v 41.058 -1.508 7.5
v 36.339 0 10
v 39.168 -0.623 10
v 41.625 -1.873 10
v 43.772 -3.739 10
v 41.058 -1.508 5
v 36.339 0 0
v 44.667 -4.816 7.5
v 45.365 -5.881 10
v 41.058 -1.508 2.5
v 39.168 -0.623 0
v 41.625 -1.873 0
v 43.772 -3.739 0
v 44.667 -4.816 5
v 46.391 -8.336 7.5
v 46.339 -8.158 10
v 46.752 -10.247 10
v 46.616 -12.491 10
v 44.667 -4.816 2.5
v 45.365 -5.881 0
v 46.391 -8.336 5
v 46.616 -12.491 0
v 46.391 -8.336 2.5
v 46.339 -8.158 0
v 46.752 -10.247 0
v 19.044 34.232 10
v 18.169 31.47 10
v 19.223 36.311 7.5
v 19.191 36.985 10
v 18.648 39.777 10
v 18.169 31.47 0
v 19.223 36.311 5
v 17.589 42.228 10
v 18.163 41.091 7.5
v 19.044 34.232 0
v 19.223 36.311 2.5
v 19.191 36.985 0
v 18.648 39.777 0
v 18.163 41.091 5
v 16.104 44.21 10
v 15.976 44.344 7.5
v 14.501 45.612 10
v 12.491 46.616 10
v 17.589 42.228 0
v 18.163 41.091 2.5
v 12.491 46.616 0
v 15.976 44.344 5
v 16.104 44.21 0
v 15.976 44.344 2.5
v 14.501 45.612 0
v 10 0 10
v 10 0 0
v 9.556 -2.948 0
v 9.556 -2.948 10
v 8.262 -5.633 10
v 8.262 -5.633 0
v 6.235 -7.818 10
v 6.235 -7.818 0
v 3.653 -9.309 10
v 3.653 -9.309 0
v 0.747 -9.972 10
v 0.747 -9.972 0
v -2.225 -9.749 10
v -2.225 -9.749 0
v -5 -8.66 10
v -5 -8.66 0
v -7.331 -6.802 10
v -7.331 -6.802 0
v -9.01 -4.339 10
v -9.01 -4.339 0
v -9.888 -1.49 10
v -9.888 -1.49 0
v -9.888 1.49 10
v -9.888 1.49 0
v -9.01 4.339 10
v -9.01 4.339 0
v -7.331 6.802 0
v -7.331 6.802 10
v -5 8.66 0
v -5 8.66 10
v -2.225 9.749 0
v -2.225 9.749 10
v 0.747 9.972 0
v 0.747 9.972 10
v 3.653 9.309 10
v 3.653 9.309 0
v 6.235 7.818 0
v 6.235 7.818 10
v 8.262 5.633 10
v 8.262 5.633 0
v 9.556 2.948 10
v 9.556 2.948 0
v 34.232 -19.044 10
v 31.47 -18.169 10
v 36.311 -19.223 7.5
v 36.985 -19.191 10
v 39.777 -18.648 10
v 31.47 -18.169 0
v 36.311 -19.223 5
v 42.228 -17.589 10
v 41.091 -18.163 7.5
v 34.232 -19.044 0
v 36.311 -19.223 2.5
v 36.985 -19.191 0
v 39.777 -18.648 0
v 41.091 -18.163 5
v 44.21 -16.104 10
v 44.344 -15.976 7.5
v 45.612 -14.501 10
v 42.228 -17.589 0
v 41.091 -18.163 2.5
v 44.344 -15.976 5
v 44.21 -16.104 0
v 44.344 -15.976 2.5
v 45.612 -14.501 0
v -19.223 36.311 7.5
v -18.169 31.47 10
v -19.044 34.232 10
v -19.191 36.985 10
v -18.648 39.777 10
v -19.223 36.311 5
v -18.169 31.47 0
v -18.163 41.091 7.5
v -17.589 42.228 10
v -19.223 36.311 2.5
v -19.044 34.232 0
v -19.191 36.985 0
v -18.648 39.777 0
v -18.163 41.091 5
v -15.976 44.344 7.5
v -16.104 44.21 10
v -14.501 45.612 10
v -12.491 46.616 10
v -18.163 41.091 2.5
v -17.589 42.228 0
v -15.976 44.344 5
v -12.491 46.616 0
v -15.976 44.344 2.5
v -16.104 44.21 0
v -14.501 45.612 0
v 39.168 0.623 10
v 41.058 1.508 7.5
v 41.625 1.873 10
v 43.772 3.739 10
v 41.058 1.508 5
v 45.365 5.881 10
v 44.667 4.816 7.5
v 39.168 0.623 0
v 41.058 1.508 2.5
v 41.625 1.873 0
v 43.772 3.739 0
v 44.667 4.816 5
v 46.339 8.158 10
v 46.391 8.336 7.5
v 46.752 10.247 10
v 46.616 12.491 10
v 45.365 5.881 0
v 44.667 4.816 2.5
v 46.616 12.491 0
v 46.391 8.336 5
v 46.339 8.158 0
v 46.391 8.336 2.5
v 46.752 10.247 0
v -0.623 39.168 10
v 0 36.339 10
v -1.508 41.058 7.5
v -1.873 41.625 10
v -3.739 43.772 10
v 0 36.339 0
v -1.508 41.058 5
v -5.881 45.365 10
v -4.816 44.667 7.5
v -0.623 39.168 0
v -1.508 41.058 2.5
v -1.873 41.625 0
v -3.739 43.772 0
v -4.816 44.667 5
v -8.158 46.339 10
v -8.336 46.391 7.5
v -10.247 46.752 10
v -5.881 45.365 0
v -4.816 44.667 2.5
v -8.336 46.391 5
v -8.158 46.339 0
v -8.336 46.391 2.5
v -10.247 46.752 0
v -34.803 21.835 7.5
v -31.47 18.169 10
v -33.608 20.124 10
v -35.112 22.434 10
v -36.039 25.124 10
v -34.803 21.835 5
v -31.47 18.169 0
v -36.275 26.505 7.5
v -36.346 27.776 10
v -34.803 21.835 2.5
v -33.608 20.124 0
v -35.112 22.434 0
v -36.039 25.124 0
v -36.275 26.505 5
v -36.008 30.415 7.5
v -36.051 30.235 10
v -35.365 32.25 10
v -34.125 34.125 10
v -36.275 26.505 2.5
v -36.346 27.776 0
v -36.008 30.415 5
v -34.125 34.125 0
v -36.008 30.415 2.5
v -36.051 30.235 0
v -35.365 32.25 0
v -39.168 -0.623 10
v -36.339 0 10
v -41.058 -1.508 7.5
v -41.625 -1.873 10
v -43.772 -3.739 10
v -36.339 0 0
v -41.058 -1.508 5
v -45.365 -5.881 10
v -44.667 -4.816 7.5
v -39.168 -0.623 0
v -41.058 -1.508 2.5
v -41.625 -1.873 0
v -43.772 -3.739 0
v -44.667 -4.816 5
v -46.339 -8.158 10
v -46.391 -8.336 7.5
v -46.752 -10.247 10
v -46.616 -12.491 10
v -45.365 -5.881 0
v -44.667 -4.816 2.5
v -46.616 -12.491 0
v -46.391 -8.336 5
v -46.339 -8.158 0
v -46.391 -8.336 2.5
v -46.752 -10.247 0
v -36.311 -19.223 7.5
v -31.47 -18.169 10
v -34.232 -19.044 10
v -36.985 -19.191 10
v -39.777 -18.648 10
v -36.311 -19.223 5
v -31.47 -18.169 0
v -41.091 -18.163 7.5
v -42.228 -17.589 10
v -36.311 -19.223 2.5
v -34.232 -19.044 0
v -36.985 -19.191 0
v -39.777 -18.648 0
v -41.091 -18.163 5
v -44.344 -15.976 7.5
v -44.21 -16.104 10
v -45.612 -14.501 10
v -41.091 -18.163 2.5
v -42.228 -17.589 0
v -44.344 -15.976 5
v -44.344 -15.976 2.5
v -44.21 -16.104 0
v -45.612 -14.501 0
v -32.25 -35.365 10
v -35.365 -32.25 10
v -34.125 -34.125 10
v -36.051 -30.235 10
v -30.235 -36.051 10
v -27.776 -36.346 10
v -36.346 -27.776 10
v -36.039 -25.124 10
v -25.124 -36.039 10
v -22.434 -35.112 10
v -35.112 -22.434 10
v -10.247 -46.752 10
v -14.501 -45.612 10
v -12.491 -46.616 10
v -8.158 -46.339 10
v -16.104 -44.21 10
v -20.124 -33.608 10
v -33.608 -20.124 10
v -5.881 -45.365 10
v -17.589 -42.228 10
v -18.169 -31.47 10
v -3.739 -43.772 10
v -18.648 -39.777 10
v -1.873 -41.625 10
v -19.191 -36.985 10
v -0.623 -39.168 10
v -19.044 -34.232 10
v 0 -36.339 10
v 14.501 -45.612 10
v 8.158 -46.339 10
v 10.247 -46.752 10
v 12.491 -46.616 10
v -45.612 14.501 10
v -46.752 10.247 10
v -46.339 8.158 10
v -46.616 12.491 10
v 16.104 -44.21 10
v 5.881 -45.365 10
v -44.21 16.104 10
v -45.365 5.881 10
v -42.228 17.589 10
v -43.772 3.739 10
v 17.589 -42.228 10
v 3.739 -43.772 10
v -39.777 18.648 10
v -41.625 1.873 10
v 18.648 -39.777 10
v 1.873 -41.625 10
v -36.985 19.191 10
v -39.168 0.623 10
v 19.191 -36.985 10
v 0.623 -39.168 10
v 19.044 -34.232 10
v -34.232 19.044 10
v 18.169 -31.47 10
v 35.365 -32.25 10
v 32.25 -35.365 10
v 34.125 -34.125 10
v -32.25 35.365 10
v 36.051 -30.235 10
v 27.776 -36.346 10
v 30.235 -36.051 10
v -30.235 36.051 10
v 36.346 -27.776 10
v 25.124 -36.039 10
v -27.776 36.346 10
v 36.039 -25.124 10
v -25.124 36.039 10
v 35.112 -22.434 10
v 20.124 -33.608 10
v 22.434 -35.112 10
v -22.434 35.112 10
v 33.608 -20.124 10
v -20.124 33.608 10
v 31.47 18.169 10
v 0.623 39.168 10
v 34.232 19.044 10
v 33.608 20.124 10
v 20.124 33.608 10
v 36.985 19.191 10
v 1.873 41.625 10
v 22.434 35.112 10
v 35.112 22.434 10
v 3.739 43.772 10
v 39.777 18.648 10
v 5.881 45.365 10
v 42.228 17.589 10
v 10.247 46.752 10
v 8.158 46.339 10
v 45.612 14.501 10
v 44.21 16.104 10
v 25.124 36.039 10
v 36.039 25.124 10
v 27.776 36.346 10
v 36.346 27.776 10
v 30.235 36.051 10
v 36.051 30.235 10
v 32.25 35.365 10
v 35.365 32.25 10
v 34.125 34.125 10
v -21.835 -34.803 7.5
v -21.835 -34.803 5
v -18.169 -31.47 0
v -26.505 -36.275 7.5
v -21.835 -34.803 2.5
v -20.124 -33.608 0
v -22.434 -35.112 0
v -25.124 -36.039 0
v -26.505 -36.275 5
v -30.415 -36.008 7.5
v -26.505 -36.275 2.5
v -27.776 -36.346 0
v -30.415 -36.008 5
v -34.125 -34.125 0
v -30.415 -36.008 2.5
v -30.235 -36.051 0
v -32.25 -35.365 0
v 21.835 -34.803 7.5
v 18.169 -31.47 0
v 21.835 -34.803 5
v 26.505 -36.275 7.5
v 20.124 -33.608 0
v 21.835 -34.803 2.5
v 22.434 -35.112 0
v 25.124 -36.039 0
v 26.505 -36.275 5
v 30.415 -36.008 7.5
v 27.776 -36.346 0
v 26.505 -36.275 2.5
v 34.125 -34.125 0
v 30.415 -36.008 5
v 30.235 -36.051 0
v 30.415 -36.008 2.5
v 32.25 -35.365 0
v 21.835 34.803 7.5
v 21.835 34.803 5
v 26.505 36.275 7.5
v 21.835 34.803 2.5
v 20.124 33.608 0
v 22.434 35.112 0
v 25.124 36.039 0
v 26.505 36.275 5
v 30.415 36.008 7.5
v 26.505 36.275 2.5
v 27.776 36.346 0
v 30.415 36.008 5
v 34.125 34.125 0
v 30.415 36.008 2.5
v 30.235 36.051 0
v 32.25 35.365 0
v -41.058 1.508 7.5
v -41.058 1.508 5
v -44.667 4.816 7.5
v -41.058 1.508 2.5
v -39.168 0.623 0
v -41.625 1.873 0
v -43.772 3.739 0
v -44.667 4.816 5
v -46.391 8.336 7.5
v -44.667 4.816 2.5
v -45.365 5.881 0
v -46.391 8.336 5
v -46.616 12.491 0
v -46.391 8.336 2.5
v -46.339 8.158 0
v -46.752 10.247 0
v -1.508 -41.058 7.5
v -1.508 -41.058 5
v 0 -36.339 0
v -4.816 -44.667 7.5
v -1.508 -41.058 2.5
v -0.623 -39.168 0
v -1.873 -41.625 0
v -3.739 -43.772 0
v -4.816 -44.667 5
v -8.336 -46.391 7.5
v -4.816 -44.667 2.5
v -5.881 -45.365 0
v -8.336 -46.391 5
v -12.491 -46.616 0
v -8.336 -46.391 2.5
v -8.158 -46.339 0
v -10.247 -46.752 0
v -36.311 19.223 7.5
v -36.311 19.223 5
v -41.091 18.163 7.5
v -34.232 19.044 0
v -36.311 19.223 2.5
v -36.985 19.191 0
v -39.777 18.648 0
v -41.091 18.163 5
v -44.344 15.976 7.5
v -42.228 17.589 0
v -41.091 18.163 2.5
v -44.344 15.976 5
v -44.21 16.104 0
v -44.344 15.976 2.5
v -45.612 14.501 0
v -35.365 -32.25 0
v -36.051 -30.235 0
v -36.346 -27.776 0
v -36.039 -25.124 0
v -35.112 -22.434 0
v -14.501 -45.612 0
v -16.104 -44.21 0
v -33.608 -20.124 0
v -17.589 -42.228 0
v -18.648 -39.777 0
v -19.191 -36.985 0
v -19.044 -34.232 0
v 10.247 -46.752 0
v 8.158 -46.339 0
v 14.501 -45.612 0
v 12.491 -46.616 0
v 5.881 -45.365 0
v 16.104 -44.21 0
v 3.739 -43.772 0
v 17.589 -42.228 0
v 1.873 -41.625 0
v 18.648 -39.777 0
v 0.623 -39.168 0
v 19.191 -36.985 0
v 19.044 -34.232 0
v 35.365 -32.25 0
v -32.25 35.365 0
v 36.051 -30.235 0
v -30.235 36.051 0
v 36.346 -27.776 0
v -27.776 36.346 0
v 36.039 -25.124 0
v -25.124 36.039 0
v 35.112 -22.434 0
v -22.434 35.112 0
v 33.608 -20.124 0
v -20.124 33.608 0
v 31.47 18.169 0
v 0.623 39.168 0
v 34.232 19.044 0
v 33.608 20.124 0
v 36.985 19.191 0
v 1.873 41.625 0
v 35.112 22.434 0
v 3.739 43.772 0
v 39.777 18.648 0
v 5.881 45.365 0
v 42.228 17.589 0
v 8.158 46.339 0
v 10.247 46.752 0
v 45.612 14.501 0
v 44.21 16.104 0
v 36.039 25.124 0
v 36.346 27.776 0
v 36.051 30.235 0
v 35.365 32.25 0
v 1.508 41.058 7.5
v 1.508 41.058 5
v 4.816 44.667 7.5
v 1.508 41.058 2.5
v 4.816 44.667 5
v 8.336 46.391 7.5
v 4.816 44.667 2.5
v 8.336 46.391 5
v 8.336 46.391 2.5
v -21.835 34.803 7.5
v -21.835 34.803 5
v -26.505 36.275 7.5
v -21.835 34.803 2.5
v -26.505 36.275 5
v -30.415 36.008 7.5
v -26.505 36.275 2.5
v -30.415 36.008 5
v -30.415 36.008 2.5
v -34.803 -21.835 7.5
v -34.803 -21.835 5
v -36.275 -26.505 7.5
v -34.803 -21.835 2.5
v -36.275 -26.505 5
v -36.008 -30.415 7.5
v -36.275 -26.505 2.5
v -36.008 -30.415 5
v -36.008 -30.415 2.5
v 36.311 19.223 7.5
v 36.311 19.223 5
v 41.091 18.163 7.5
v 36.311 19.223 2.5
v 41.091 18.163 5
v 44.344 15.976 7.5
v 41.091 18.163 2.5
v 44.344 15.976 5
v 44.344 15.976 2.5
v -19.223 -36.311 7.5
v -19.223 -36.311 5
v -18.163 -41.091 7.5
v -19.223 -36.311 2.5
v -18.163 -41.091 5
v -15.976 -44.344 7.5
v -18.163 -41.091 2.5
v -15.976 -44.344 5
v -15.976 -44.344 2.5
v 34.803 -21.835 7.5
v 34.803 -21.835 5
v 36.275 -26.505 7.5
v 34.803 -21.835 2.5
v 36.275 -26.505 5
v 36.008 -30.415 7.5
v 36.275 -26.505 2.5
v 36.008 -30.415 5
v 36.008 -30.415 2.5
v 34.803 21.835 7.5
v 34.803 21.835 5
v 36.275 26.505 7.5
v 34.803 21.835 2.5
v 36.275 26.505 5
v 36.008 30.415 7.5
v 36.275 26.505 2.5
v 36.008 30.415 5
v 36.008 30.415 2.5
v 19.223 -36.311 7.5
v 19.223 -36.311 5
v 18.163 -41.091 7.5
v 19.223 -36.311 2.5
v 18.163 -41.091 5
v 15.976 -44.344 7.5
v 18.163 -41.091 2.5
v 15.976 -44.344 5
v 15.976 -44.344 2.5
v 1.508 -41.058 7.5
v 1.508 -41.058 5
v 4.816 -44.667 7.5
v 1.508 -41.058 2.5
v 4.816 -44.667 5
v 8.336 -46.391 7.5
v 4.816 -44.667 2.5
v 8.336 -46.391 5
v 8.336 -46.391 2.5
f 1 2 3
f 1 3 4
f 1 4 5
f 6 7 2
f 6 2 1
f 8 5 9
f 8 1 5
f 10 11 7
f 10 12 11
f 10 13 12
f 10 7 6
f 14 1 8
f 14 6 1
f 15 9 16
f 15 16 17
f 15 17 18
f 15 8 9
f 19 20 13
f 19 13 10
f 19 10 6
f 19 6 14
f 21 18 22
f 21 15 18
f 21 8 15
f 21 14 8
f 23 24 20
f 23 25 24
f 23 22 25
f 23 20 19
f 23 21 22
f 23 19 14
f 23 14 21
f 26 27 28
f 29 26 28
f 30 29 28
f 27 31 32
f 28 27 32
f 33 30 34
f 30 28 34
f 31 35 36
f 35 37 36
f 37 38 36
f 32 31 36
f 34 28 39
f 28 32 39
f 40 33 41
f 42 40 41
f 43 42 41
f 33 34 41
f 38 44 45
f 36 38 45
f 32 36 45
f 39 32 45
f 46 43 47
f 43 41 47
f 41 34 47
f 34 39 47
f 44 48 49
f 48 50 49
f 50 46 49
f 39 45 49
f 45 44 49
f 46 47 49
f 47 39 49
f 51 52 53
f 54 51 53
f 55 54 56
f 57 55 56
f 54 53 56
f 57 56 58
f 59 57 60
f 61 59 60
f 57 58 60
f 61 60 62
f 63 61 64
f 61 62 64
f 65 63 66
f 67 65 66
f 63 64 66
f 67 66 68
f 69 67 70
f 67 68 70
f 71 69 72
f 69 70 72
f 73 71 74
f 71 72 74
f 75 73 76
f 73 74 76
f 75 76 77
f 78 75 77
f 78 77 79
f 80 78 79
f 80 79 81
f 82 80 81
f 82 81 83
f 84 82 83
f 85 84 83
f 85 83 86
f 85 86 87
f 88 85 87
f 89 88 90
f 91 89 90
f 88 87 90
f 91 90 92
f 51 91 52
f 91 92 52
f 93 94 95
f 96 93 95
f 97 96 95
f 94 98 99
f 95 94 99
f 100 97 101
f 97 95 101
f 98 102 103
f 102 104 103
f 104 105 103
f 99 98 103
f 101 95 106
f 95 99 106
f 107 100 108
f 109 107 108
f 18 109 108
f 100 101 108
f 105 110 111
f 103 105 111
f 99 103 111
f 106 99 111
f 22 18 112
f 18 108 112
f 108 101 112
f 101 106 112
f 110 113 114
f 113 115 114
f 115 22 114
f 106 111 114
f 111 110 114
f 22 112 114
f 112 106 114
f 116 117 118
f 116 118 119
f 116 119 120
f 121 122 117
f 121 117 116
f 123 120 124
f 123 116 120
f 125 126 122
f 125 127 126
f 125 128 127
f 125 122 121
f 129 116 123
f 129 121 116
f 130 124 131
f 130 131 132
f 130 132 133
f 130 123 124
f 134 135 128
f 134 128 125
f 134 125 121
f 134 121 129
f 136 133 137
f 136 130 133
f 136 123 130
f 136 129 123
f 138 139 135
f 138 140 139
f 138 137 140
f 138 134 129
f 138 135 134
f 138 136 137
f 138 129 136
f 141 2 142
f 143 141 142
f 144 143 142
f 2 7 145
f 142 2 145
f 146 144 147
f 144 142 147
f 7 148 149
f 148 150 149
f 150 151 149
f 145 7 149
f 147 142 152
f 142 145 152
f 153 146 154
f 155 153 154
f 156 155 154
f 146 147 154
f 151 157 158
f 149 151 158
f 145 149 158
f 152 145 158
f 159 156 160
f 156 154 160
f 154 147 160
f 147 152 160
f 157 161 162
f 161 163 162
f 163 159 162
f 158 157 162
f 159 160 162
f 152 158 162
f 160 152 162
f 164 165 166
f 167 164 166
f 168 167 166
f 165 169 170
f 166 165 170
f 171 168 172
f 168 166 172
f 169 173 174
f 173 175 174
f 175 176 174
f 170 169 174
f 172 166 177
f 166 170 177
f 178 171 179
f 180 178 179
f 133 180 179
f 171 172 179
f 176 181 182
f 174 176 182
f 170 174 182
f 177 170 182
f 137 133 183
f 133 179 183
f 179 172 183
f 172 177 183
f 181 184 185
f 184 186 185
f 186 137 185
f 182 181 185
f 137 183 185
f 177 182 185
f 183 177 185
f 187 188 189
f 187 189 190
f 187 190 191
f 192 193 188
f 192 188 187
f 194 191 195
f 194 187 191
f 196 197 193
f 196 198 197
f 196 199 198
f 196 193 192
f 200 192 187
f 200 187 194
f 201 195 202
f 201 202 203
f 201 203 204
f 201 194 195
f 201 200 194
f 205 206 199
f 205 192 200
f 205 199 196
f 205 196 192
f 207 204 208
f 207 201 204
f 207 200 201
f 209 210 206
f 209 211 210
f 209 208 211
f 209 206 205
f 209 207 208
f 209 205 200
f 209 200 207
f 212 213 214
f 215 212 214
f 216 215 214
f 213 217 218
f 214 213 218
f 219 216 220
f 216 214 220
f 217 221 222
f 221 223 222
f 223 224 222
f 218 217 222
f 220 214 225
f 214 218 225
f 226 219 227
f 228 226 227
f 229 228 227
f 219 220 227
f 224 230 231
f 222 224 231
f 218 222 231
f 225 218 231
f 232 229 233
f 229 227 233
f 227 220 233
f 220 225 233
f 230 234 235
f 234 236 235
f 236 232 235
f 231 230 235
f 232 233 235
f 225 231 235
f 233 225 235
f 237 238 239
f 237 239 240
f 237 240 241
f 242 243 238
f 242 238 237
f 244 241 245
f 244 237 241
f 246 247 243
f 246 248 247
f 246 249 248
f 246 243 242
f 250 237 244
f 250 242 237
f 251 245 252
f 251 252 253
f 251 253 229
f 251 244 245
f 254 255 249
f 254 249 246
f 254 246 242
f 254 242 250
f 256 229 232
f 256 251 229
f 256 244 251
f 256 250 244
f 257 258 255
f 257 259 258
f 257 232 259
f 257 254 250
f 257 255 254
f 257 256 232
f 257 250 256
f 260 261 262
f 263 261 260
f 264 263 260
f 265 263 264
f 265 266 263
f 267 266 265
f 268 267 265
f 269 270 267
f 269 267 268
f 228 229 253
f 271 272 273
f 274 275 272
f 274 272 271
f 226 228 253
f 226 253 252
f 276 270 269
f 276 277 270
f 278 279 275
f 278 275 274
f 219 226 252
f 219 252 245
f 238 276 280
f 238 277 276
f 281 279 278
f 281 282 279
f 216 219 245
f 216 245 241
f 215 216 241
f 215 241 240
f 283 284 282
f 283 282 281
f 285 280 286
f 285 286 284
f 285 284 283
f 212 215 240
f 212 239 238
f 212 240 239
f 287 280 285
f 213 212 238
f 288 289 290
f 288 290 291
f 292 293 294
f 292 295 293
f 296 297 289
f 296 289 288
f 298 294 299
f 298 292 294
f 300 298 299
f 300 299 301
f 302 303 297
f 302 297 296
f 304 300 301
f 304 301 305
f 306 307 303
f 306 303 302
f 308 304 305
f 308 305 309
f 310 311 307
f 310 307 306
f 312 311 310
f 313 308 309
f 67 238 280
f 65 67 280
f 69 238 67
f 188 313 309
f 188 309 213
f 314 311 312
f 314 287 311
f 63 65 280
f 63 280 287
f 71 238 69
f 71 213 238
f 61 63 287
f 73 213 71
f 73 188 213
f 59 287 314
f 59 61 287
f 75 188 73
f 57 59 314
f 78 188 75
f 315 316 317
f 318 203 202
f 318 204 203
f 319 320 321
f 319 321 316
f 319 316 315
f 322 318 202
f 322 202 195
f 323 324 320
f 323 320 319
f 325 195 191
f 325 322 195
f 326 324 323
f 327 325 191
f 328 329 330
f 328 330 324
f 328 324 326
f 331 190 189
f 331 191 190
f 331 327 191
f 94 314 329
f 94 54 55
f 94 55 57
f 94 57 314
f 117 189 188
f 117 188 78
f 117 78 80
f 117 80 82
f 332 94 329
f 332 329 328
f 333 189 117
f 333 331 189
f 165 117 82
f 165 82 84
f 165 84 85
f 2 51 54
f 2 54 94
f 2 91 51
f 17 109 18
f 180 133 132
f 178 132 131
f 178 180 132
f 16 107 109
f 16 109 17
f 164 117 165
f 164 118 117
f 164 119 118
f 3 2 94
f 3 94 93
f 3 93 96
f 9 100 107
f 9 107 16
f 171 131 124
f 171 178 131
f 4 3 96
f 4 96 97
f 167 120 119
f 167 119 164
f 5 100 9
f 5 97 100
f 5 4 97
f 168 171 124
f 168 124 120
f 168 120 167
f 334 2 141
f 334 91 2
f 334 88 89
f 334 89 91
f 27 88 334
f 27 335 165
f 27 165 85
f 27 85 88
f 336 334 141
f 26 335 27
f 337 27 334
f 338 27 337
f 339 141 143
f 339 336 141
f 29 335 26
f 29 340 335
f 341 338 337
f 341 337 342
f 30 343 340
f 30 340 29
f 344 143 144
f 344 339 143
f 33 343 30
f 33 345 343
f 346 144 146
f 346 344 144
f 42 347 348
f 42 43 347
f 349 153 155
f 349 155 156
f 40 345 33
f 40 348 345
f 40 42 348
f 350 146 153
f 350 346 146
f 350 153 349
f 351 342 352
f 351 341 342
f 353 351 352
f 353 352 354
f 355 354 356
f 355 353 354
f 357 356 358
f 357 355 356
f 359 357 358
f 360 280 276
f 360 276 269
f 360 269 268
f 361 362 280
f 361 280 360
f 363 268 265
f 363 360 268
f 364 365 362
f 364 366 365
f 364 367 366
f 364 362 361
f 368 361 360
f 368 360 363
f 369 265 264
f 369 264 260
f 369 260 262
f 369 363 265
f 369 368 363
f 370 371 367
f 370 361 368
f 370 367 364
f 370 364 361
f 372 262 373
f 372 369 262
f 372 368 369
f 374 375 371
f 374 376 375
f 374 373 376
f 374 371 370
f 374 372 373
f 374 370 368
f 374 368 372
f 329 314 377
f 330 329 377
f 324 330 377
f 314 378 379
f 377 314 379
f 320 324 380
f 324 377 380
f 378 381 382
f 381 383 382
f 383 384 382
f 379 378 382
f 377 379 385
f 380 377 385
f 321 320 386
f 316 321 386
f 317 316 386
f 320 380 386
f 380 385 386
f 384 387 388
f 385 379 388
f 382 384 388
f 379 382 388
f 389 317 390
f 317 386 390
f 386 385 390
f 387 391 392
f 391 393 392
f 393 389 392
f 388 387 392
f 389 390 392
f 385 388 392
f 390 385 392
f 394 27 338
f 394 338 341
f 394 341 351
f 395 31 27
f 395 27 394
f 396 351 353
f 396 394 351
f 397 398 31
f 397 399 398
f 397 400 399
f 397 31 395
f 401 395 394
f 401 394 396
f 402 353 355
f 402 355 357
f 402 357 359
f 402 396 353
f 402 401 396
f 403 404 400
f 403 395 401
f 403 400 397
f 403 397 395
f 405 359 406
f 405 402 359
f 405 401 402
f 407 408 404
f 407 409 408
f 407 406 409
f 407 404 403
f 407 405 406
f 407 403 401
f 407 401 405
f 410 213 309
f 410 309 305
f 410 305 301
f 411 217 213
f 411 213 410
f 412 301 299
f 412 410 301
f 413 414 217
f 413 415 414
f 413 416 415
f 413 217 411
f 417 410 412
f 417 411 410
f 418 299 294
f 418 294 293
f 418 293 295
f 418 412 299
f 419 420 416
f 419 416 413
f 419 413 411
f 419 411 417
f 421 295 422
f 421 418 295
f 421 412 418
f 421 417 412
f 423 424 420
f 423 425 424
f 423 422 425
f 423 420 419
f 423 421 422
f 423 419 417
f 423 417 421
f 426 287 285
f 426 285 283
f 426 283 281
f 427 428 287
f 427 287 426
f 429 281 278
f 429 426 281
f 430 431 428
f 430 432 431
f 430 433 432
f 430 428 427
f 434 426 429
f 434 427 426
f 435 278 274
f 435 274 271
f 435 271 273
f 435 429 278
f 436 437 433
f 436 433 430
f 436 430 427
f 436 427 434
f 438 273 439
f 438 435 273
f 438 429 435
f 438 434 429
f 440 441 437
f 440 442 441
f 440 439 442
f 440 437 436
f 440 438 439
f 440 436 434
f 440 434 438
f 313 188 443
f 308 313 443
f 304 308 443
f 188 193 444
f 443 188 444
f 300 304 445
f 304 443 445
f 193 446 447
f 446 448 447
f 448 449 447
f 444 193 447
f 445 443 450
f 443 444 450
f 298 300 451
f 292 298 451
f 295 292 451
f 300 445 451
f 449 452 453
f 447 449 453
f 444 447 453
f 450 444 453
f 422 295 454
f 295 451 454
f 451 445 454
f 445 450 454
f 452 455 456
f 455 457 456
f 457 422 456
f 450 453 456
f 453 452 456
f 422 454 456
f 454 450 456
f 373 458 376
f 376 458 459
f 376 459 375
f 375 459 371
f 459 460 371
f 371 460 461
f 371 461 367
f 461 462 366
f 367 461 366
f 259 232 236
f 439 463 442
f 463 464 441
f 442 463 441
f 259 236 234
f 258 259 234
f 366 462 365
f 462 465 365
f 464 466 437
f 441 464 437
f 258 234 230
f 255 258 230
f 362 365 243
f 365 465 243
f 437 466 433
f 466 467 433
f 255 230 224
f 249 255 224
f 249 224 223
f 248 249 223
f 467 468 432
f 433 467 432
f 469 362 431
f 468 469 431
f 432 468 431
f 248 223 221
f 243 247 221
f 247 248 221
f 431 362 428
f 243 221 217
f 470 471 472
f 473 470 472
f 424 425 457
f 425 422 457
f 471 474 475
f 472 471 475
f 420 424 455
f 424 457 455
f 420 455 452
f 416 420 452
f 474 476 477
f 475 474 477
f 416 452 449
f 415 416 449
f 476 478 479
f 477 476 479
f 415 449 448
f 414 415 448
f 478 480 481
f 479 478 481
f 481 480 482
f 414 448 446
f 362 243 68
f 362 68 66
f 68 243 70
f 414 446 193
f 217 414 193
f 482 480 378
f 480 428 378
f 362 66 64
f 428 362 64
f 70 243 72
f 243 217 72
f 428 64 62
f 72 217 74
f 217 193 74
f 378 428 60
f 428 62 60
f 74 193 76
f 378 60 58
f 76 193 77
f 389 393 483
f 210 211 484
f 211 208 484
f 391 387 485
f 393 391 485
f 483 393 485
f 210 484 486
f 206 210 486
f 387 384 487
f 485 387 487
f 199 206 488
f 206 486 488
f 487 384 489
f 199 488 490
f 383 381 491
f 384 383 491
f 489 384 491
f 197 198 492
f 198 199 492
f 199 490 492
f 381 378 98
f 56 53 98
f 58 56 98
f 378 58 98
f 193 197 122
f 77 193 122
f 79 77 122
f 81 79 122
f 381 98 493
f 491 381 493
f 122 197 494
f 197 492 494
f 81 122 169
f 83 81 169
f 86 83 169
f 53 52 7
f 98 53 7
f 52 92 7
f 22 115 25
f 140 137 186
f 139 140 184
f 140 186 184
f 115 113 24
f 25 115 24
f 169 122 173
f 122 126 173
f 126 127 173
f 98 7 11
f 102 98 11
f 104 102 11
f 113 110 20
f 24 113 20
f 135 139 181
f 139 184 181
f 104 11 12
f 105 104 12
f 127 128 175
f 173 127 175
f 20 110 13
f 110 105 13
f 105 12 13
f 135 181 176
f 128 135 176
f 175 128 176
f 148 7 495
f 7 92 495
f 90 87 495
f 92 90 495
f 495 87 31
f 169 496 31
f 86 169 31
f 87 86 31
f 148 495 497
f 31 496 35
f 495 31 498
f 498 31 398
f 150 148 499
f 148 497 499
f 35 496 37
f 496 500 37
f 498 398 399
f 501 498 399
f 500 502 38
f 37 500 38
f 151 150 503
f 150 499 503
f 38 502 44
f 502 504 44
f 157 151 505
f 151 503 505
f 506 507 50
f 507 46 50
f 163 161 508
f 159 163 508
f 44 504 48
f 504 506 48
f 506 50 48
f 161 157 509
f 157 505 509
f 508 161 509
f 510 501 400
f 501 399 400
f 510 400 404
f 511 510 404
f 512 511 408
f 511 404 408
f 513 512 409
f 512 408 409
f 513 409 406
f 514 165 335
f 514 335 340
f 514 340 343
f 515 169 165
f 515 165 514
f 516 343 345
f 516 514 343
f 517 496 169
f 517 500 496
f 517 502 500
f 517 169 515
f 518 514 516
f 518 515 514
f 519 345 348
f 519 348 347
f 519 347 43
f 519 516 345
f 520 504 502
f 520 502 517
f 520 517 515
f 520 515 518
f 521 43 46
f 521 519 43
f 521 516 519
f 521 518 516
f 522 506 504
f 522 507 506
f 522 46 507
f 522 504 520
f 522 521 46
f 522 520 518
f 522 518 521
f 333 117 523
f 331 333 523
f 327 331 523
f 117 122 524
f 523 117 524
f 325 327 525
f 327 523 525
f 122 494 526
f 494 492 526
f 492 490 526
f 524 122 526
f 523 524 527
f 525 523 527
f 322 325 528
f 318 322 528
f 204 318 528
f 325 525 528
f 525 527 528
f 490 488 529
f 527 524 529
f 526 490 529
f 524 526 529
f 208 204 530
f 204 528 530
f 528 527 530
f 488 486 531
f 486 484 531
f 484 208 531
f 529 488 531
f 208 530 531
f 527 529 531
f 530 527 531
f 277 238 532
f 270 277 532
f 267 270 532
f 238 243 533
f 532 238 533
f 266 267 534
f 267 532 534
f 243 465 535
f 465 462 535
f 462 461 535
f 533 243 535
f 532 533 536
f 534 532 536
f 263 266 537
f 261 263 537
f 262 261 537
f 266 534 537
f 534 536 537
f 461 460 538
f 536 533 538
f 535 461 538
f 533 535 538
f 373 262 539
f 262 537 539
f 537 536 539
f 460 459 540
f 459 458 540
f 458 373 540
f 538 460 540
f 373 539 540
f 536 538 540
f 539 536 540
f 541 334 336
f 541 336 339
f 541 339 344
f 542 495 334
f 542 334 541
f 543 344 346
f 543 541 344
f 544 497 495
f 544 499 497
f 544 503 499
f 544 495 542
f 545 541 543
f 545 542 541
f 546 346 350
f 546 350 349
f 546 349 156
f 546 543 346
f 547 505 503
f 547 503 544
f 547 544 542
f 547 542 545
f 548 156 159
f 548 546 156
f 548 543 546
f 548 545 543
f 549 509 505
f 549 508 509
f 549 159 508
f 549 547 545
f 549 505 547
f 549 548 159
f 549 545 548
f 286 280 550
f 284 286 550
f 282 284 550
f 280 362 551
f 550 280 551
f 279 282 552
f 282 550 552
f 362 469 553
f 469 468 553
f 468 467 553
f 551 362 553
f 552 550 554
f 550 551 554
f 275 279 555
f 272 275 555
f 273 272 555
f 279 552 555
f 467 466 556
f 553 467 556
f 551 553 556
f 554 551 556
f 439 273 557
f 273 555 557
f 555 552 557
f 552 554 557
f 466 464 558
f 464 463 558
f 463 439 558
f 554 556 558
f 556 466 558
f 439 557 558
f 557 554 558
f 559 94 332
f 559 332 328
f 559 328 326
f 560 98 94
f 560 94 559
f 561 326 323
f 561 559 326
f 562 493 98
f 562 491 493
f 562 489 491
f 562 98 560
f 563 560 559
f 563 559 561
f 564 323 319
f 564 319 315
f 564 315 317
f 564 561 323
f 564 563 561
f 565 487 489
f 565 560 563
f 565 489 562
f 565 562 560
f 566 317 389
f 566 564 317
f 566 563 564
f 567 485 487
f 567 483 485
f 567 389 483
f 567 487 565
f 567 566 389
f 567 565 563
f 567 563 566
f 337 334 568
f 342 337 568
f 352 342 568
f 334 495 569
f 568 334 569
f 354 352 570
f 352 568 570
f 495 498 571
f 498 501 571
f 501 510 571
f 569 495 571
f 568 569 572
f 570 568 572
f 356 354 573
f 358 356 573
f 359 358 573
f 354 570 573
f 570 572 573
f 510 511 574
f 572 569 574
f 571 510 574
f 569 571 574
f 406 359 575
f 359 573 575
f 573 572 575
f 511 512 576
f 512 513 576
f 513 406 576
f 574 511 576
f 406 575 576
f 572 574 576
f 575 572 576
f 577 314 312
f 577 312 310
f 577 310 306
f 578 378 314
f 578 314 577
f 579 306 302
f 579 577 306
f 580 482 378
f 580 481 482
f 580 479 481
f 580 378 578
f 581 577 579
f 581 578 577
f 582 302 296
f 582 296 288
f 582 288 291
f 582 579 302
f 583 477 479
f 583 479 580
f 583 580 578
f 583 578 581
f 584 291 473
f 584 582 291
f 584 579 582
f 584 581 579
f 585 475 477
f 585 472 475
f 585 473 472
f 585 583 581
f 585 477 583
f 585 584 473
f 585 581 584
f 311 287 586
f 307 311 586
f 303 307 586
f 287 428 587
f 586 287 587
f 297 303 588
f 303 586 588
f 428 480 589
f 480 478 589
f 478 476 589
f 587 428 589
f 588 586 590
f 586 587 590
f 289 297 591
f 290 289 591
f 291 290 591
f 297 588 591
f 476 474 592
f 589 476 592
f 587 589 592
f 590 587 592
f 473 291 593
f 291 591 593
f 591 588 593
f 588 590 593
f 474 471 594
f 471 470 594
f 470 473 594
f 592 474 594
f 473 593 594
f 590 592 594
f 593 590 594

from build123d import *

# Parameters (mm, degrees)
F1_DEPTH = 10


with BuildPart() as f1:
    # F0 (on Top) → F1 (new body)
    with BuildSketch(Plane.XY):
        with BuildLine():
            ThreePointArc((-10, 0), (0, 10), (10, 0))
            Line((10, 0), (36.3385102814, 0))
            add(Edge.make_bspline(
                [(36.3385102814, 0), (38.1493832545, 0.2133160809), (41.1543741544, 1.1173907107), (44.8944975107, 4.6532514581), (46.5891533047, 8.2707380904), (46.9314032298, 11.0166099485), (46.6155803767, 12.4906071166)],
                knots=[0, 0, 0, 0, 0.2631644028, 0.5247795892, 0.7588354663, 1, 1, 1, 1], degree=3))
            add(Edge.make_bspline(
                [(31.4700730394, 18.1692551407), (33.1449930775, 18.8899544822), (36.1994288499, 19.6094983358), (41.2064010634, 18.4174147824), (44.4827593479, 16.131907358), (46.1520924066, 13.9250375359), (46.6155803767, 12.4906071166)],
                knots=[0, 0, 0, 0, 0.2631644028, 0.5247795892, 0.7588354663, 1, 1, 1, 1], degree=3))
            add(Edge.make_bspline(
                [(31.4700730394, 18.1692551407), (32.9316769966, 19.2594287723), (35.0820381392, 21.5448758186), (36.5531496053, 26.4770827283), (36.2120212575, 30.4572459467), (35.135482458, 33.0063656939), (34.1249732601, 34.1249732601)],
                knots=[0, 0, 0, 0, 0.2631644028, 0.5247795892, 0.7588354663, 1, 1, 1, 1], degree=3))
            add(Edge.make_bspline(
                [(18.1692551407, 31.4700730394), (19.2594287723, 32.9316769966), (21.5448758186, 35.0820381392), (26.4770827283, 36.5531496053), (30.4572459467, 36.2120212575), (33.0063656939, 35.135482458), (34.1249732601, 34.1249732601)],
                knots=[0, 0, 0, 0, 0.2631644028, 0.5247795892, 0.7588354663, 1, 1, 1, 1], degree=3))
            add(Edge.make_bspline(
                [(18.1692551407, 31.4700730394), (18.8899544822, 33.1449930775), (19.6094983358, 36.1994288499), (18.4174147824, 41.2064010634), (16.131907358, 44.4827593479), (13.9250375359, 46.1520924066), (12.4906071166, 46.6155803767)],
                knots=[0, 0, 0, 0, 0.2631644028, 0.5247795892, 0.7588354663, 1, 1, 1, 1], degree=3))
            add(Edge.make_bspline(
                [(0, 36.3385102814), (0.2133160809, 38.1493832545), (1.1173907107, 41.1543741544), (4.6532514581, 44.8944975107), (8.2707380904, 46.5891533047), (11.0166099485, 46.9314032298), (12.4906071166, 46.6155803767)],
                knots=[0, 0, 0, 0, 0.2631644028, 0.5247795892, 0.7588354663, 1, 1, 1, 1], degree=3))
            add(Edge.make_bspline(
                [(0, 36.3385102814), (-0.2133160809, 38.1493832545), (-1.1173907107, 41.1543741544), (-4.6532514581, 44.8944975107), (-8.2707380904, 46.5891533047), (-11.0166099485, 46.9314032298), (-12.4906071166, 46.6155803767)],
                knots=[0, 0, 0, 0, 0.2631644028, 0.5247795892, 0.7588354663, 1, 1, 1, 1], degree=3))
            add(Edge.make_bspline(
                [(-18.1692551407, 31.4700730394), (-18.8899544822, 33.1449930775), (-19.6094983358, 36.1994288499), (-18.4174147824, 41.2064010634), (-16.131907358, 44.4827593479), (-13.9250375359, 46.1520924066), (-12.4906071166, 46.6155803767)],
                knots=[0, 0, 0, 0, 0.2631644028, 0.5247795892, 0.7588354663, 1, 1, 1, 1], degree=3))
            add(Edge.make_bspline(
                [(-18.1692551407, 31.4700730394), (-19.2594287723, 32.9316769966), (-21.5448758186, 35.0820381392), (-26.4770827283, 36.5531496053), (-30.4572459467, 36.2120212575), (-33.0063656939, 35.135482458), (-34.1249732601, 34.1249732601)],
                knots=[0, 0, 0, 0, 0.2631644028, 0.5247795892, 0.7588354663, 1, 1, 1, 1], degree=3))
            add(Edge.make_bspline(
                [(-31.4700730394, 18.1692551407), (-32.9316769966, 19.2594287723), (-35.0820381392, 21.5448758186), (-36.5531496053, 26.4770827283), (-36.2120212575, 30.4572459467), (-35.135482458, 33.0063656939), (-34.1249732601, 34.1249732601)],
                knots=[0, 0, 0, 0, 0.2631644028, 0.5247795892, 0.7588354663, 1, 1, 1, 1], degree=3))
            add(Edge.make_bspline(
                [(-31.4700730394, 18.1692551407), (-33.1449930775, 18.8899544822), (-36.1994288499, 19.6094983358), (-41.2064010634, 18.4174147824), (-44.4827593479, 16.131907358), (-46.1520924066, 13.9250375359), (-46.6155803767, 12.4906071166)],
                knots=[0, 0, 0, 0, 0.2631644028, 0.5247795892, 0.7588354663, 1, 1, 1, 1], degree=3))
            add(Edge.make_bspline(
                [(-36.3385102814, 0), (-38.1493832545, 0.2133160809), (-41.1543741544, 1.1173907107), (-44.8944975107, 4.6532514581), (-46.5891533047, 8.2707380904), (-46.9314032298, 11.0166099485), (-46.6155803767, 12.4906071166)],
                knots=[0, 0, 0, 0, 0.2631644028, 0.5247795892, 0.7588354663, 1, 1, 1, 1], degree=3))
            Line((-36.3385102814, 0), (-10, 0))
        make_face()
        with BuildLine():
            Line((36.3385102814, 0), (10, 0))
            ThreePointArc((10, 0), (0, -10), (-10, 0))
            Line((-10, 0), (-36.3385102814, 0))
            add(Edge.make_bspline(
                [(-36.3385102814, 0), (-38.1493832545, -0.2133160809), (-41.1543741544, -1.1173907107), (-44.8944975107, -4.6532514581), (-46.5891533047, -8.2707380904), (-46.9314032298, -11.0166099485), (-46.6155803767, -12.4906071166)],
                knots=[0, 0, 0, 0, 0.2631644028, 0.5247795892, 0.7588354663, 1, 1, 1, 1], degree=3))
            add(Edge.make_bspline(
                [(-31.4700730394, -18.1692551407), (-33.1449930775, -18.8899544822), (-36.1994288499, -19.6094983358), (-41.2064010634, -18.4174147824), (-44.4827593479, -16.131907358), (-46.1520924066, -13.9250375359), (-46.6155803767, -12.4906071166)],
                knots=[0, 0, 0, 0, 0.2631644028, 0.5247795892, 0.7588354663, 1, 1, 1, 1], degree=3))
            add(Edge.make_bspline(
                [(-31.4700730394, -18.1692551407), (-32.9316769966, -19.2594287723), (-35.0820381392, -21.5448758186), (-36.5531496053, -26.4770827283), (-36.2120212575, -30.4572459467), (-35.135482458, -33.0063656939), (-34.1249732601, -34.1249732601)],
                knots=[0, 0, 0, 0, 0.2631644028, 0.5247795892, 0.7588354663, 1, 1, 1, 1], degree=3))
            add(Edge.make_bspline(
                [(-18.1692551407, -31.4700730394), (-19.2594287723, -32.9316769966), (-21.5448758186, -35.0820381392), (-26.4770827283, -36.5531496053), (-30.4572459467, -36.2120212575), (-33.0063656939, -35.135482458), (-34.1249732601, -34.1249732601)],
                knots=[0, 0, 0, 0, 0.2631644028, 0.5247795892, 0.7588354663, 1, 1, 1, 1], degree=3))
            add(Edge.make_bspline(
                [(-18.1692551407, -31.4700730394), (-18.8899544822, -33.1449930775), (-19.6094983358, -36.1994288499), (-18.4174147824, -41.2064010634), (-16.131907358, -44.4827593479), (-13.9250375359, -46.1520924066), (-12.4906071166, -46.6155803767)],
                knots=[0, 0, 0, 0, 0.2631644028, 0.5247795892, 0.7588354663, 1, 1, 1, 1], degree=3))
            add(Edge.make_bspline(
                [(0, -36.3385102814), (-0.2133160809, -38.1493832545), (-1.1173907107, -41.1543741544), (-4.6532514581, -44.8944975107), (-8.2707380904, -46.5891533047), (-11.0166099485, -46.9314032298), (-12.4906071166, -46.6155803767)],
                knots=[0, 0, 0, 0, 0.2631644028, 0.5247795892, 0.7588354663, 1, 1, 1, 1], degree=3))
            add(Edge.make_bspline(
                [(0, -36.3385102814), (0.2133160809, -38.1493832545), (1.1173907107, -41.1543741544), (4.6532514581, -44.8944975107), (8.2707380904, -46.5891533047), (11.0166099485, -46.9314032298), (12.4906071166, -46.6155803767)],
                knots=[0, 0, 0, 0, 0.2631644028, 0.5247795892, 0.7588354663, 1, 1, 1, 1], degree=3))
            add(Edge.make_bspline(
                [(18.1692551407, -31.4700730394), (18.8899544822, -33.1449930775), (19.6094983358, -36.1994288499), (18.4174147824, -41.2064010634), (16.131907358, -44.4827593479), (13.9250375359, -46.1520924066), (12.4906071166, -46.6155803767)],
                knots=[0, 0, 0, 0, 0.2631644028, 0.5247795892, 0.7588354663, 1, 1, 1, 1], degree=3))
            add(Edge.make_bspline(
                [(18.1692551407, -31.4700730394), (19.2594287723, -32.9316769966), (21.5448758186, -35.0820381392), (26.4770827283, -36.5531496053), (30.4572459467, -36.2120212575), (33.0063656939, -35.135482458), (34.1249732601, -34.1249732601)],
                knots=[0, 0, 0, 0, 0.2631644028, 0.5247795892, 0.7588354663, 1, 1, 1, 1], degree=3))
            add(Edge.make_bspline(
                [(31.4700730394, -18.1692551407), (32.9316769966, -19.2594287723), (35.0820381392, -21.5448758186), (36.5531496053, -26.4770827283), (36.2120212575, -30.4572459467), (35.135482458, -33.0063656939), (34.1249732601, -34.1249732601)],
                knots=[0, 0, 0, 0, 0.2631644028, 0.5247795892, 0.7588354663, 1, 1, 1, 1], degree=3))
            add(Edge.make_bspline(
                [(31.4700730394, -18.1692551407), (33.1449930775, -18.8899544822), (36.1994288499, -19.6094983358), (41.2064010634, -18.4174147824), (44.4827593479, -16.131907358), (46.1520924066, -13.9250375359), (46.6155803767, -12.4906071166)],
                knots=[0, 0, 0, 0, 0.2631644028, 0.5247795892, 0.7588354663, 1, 1, 1, 1], degree=3))
            add(Edge.make_bspline(
                [(36.3385102814, 0), (38.1493832545, -0.2133160809), (41.1543741544, -1.1173907107), (44.8944975107, -4.6532514581), (46.5891533047, -8.2707380904), (46.9314032298, -11.0166099485), (46.6155803767, -12.4906071166)],
                knots=[0, 0, 0, 0, 0.2631644028, 0.5247795892, 0.7588354663, 1, 1, 1, 1], degree=3))
        make_face()
    extrude(amount=F1_DEPTH)


solid = f1.part
